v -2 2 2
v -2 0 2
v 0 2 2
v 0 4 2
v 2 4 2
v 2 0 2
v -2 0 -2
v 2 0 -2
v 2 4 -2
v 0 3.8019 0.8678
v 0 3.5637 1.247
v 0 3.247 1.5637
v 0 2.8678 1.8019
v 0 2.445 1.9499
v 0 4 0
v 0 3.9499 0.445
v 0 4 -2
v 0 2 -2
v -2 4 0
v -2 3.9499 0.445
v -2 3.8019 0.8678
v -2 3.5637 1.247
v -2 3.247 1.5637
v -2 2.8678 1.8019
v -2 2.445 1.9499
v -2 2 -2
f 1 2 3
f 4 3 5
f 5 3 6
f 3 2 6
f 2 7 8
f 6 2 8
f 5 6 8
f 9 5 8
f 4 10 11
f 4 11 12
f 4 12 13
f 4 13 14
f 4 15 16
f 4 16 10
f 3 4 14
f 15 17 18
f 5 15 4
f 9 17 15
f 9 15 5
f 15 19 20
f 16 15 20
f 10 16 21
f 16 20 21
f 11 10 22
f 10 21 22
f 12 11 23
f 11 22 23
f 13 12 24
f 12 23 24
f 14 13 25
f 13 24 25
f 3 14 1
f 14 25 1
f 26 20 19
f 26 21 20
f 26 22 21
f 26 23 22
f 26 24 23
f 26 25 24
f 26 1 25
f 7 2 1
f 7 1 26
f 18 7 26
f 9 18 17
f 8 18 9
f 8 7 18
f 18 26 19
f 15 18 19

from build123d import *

# Parameters (mm, degrees)
SKETCH1_W           = 4
SKETCH1_H           = 4
BOSS_EXTRUDE1_DEPTH = 4
CUT_EXTRUDE1_DEPTH  = 2


with BuildPart() as part:
    # Sketch1 → Boss-Extrude1 (new body)
    with BuildSketch(Plane(origin=(0, 0, 0), x_dir=(1, 0, 0), z_dir=(0, 1, 0))):
        Rectangle(SKETCH1_W, SKETCH1_H)
    extrude(amount=BOSS_EXTRUDE1_DEPTH)

    # Sketch2 → Cut-Extrude1 (cut)
    with BuildSketch(Plane.ZY.offset(2)):
        Polygon((-2, 2), (0, 4), (-2, 4), align=None)
        with BuildLine():
            Line((2, 4), (0, 4))
            ThreePointArc((0, 4), (1.414213562, 3.414213562), (2, 2))
            Line((2, 2), (2, 4))
        make_face()
    extrude(amount=-CUT_EXTRUDE1_DEPTH, mode=Mode.SUBTRACT)


solid = part.part
